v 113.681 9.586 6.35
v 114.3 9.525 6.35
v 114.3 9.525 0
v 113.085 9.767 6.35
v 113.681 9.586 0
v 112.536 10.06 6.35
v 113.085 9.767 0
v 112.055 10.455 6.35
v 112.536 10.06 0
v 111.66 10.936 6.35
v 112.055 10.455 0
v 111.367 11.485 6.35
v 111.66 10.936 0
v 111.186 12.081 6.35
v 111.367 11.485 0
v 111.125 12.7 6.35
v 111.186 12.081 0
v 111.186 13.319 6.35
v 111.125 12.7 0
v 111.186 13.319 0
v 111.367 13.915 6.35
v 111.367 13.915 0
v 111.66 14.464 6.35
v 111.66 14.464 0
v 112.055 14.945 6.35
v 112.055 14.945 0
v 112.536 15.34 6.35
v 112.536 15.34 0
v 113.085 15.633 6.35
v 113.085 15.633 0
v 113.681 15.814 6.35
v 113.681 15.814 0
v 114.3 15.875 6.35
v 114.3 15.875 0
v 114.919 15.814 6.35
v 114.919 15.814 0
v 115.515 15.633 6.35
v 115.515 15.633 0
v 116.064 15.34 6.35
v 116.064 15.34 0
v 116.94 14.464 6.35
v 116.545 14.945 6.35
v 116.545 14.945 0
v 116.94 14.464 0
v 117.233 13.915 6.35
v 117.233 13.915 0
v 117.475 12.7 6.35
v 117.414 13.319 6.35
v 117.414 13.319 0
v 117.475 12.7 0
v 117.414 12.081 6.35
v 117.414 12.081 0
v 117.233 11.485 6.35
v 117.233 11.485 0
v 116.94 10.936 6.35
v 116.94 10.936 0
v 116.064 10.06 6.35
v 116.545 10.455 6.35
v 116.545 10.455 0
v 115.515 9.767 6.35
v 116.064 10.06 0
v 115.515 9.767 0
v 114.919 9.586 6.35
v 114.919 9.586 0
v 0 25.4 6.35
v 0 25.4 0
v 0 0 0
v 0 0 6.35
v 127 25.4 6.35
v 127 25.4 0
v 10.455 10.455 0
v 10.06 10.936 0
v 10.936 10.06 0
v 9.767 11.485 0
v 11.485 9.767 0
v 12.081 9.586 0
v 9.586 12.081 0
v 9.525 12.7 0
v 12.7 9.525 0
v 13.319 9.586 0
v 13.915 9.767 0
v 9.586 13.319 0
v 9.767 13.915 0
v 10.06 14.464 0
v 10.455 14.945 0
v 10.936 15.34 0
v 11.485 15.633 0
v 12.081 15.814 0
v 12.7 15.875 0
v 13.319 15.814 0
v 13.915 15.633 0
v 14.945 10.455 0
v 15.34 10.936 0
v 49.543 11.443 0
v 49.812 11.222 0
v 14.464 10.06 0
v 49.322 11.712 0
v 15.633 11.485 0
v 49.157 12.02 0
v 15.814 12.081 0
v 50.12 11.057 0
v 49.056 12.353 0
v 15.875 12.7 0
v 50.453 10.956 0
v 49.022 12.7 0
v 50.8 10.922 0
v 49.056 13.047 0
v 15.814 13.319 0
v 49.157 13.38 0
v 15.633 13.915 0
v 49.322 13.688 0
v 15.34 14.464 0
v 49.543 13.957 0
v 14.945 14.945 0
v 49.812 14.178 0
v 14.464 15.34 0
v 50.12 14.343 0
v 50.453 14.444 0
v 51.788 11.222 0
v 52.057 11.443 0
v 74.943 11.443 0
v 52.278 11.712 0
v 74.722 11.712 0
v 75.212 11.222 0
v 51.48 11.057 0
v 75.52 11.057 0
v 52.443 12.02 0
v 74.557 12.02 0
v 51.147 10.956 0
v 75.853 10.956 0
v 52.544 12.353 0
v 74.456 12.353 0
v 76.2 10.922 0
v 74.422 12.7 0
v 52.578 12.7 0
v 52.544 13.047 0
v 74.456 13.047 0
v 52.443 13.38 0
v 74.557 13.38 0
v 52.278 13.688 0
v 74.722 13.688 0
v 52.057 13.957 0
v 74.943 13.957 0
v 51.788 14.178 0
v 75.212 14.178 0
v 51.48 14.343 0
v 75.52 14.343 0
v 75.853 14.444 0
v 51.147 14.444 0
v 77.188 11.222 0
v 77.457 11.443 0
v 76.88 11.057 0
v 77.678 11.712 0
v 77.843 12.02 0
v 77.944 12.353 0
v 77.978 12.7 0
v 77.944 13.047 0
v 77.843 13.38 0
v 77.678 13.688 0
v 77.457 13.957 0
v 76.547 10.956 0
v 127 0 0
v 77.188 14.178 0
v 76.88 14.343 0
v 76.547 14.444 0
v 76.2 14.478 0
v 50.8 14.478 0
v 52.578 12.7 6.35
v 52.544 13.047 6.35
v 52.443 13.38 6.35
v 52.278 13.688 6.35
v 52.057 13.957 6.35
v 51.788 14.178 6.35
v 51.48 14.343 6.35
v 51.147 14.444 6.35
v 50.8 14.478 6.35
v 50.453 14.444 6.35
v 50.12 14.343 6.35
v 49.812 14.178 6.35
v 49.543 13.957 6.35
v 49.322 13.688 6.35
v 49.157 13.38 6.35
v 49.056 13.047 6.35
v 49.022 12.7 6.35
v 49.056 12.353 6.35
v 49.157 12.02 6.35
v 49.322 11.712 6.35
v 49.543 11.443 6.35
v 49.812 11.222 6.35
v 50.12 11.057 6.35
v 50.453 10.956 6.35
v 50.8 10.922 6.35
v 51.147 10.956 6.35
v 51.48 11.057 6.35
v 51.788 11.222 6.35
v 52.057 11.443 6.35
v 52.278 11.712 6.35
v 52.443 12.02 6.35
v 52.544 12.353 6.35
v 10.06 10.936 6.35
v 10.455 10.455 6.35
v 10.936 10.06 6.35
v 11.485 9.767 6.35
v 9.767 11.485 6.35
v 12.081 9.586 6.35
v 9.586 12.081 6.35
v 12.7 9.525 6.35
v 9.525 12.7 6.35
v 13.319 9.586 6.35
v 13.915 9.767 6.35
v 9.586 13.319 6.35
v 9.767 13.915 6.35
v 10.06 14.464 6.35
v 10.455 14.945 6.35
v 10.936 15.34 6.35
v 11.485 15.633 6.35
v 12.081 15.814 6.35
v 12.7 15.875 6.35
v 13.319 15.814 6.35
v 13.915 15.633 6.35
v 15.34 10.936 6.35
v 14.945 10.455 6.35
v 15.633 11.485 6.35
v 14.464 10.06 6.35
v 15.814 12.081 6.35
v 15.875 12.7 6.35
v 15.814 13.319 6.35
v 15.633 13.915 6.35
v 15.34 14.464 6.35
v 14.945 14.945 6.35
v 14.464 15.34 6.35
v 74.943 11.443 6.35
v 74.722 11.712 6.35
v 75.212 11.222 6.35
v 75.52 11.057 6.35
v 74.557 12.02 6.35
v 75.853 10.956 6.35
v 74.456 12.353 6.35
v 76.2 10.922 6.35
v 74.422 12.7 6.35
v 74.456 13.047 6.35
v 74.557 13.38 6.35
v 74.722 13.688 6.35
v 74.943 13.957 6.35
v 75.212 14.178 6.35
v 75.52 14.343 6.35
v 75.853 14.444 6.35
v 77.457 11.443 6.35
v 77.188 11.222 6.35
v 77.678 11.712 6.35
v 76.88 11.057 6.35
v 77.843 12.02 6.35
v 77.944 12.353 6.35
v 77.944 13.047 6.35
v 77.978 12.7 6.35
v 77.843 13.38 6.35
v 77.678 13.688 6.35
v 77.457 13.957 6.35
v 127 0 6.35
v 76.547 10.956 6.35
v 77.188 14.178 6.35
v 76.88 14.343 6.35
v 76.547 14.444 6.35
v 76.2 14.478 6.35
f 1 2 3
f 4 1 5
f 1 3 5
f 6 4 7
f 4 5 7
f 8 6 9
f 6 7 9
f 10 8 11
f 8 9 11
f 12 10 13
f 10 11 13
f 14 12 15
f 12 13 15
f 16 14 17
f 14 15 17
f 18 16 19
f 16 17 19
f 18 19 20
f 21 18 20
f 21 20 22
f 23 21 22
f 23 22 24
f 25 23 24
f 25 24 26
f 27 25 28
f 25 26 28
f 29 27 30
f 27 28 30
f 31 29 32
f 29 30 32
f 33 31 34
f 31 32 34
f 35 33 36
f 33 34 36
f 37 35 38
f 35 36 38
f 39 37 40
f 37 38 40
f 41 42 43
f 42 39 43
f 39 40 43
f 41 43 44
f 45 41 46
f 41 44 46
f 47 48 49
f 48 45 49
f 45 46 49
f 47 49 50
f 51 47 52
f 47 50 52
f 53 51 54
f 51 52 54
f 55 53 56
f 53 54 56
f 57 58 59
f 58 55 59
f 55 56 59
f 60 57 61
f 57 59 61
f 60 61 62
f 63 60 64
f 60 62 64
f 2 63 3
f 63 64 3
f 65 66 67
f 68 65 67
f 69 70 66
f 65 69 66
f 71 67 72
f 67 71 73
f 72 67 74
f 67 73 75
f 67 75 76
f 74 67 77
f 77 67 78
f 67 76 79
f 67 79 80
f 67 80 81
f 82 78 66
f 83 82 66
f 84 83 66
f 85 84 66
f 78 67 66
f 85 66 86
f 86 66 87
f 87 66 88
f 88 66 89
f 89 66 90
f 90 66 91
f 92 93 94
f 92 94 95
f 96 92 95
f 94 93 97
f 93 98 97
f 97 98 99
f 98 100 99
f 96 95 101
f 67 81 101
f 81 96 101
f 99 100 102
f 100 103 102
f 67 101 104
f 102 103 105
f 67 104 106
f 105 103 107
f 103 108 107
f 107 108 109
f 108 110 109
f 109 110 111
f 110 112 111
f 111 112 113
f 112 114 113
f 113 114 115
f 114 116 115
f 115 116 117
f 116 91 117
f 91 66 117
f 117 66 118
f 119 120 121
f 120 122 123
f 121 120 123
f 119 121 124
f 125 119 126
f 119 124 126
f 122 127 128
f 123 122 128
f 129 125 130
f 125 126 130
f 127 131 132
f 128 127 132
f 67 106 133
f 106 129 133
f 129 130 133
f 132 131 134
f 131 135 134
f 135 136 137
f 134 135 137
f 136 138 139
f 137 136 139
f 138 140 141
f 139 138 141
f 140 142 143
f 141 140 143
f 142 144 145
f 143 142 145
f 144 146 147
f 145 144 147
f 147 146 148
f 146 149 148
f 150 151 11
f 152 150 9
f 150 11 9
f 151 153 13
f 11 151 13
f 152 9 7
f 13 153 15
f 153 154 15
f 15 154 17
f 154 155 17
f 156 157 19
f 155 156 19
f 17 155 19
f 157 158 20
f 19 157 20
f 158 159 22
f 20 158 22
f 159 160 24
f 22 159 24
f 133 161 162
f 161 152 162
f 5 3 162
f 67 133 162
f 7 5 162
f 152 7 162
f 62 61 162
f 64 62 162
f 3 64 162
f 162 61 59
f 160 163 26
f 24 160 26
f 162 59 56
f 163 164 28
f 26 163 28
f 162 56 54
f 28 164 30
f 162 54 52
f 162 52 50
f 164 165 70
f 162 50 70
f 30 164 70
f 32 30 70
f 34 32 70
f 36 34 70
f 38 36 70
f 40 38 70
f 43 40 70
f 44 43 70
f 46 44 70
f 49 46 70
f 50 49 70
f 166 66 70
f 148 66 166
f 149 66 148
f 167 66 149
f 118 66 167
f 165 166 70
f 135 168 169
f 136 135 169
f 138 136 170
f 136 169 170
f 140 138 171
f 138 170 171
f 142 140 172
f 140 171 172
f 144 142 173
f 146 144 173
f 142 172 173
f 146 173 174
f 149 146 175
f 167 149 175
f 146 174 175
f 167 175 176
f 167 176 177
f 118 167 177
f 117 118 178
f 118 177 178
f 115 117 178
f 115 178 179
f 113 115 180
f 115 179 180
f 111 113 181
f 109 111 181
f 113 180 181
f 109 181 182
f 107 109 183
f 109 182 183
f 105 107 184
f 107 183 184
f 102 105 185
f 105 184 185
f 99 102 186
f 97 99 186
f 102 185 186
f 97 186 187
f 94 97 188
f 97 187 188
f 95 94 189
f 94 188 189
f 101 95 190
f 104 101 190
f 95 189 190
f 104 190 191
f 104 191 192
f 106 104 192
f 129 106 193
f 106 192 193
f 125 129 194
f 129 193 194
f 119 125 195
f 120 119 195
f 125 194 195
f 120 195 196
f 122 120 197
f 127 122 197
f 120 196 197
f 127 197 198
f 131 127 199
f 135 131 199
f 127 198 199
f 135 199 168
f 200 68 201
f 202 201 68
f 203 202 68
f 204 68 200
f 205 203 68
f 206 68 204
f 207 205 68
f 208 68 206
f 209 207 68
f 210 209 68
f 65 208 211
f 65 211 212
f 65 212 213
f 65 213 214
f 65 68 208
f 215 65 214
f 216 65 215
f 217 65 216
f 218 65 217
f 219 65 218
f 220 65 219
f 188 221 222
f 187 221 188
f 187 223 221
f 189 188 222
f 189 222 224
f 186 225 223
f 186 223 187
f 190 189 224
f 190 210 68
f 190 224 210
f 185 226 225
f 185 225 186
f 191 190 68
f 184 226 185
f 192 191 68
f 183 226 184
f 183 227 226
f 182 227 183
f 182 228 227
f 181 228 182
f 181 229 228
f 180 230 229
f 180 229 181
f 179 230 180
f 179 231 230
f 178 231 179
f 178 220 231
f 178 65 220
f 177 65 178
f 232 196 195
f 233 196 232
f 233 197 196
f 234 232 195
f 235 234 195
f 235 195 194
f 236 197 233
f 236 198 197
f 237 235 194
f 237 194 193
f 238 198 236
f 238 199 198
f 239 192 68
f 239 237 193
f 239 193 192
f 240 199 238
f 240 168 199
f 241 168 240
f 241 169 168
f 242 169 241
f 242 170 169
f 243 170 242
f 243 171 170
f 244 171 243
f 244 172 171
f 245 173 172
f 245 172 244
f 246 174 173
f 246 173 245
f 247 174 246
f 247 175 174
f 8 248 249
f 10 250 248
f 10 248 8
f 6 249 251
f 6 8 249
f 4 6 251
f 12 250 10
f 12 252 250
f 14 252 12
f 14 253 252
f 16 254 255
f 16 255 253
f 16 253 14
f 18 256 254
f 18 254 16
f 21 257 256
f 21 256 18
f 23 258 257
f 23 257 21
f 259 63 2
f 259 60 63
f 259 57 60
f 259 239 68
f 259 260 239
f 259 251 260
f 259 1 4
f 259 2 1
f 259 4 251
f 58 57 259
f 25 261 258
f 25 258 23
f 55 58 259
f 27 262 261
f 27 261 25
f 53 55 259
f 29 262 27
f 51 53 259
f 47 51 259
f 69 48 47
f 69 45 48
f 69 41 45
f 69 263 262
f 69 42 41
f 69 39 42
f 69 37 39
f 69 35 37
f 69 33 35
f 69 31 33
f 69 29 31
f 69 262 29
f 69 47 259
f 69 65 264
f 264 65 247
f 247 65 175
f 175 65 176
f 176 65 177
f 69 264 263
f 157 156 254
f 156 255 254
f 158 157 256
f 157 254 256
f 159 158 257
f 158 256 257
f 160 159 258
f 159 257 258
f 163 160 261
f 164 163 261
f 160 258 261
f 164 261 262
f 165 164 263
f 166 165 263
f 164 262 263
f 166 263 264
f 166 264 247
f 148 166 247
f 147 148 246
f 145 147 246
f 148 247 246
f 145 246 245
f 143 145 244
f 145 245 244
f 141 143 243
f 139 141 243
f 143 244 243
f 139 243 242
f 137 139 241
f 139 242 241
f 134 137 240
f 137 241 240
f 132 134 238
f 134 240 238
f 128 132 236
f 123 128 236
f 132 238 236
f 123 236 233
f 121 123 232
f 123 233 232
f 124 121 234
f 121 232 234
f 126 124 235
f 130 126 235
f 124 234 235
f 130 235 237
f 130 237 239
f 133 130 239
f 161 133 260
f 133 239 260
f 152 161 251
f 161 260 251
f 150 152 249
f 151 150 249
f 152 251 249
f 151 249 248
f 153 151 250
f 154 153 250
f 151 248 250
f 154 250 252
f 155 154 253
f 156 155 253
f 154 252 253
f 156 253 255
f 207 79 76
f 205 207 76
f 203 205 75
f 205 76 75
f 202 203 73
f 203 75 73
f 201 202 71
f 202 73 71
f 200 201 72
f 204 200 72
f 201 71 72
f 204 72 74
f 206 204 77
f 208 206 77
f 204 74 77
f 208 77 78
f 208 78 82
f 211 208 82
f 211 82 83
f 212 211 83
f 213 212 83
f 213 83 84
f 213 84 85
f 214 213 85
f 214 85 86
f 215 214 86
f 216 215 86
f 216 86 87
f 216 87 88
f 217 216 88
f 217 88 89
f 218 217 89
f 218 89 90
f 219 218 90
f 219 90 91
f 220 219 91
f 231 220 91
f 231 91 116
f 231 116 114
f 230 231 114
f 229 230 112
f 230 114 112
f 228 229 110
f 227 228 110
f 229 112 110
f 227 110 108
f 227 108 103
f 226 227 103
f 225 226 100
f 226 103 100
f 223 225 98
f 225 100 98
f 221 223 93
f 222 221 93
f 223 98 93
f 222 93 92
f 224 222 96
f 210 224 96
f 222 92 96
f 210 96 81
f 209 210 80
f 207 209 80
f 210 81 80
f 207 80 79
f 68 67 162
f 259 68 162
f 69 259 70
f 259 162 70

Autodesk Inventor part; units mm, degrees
ref_plane "YZ Plane" through (0, 0, 0) normal (1, 0, 0) x (0, 1, 0)
ref_plane "XZ Plane" through (0, 0, 0) normal (0, 1, 0) x (-1, 0, 0)
sketch "Sketch1" plane through (0, 0, 0) normal (0, 0, 1) x (1, 0, 0)
  line L0 (0, 0) -> (127, 0)
  line L1 (127, 0) -> (127, 25.4)
  line L2 (127, 25.4) -> (0, 25.4)
  line L3 (0, 25.4) -> (0, 0)
  dimension "d0" = 127
  dimension "d1" = 25.4
extrude "Extrusion1" add sketch "Sketch1" along normal blind 6.35
sketch "Sketch2" plane through (0, 0, 6.35) normal (0, 0, 1) x (1, 0, 0)
  line L0 (0, 25.4) -> (0, 0) projected
  point P0 (12.7, 12.7)
  dimension "d4" = 12.7
hole "Hole1" at (12.7, 12.7, 6.35) direction (0, 0, -1) diameter 6.35 end through all
thread "Thread1" size "1/4-20 UNC" class "2B" standard "ANSI Unified Screw Threads" full length
ref_plane "Work Plane1" through (63.5, 0, 0) normal (1, 0, 0) x (0, 0, -1)
mirror "Mirror1" about plane through (63.5, 0, 0) normal (1, 0, 0) of "Hole1"
thread "Thread2" size "1/4-20 UNC" class "2B" standard "ANSI Unified Screw Threads" full length
sketch "Sketch4" plane through (0, 0, 6.35) normal (0, 0, 1) x (1, 0, 0)
  line L0 (127, 25.4) -> (0, 25.4) projected
  line L1 (0, 25.4) -> (0, 0) projected
  line L2 (127, 0) -> (127, 25.4) projected
  circle A0 centre (50.8, 12.7) radius 1.778
  circle A1 centre (76.2, 12.7) radius 1.778
  dimension "d28" = 12.7
  dimension "d29" = 12.7
  dimension "d30" = 50.8
  dimension "d31" = 50.8
  dimension "d32" = 3.556
extrude "Extrusion3" cut sketch "Sketch4" against normal blind 6.35
equation "\"d29\" = d28"
equation "\"d31\" = d30"
properties part number "Plate that doewsn't touch lander"
